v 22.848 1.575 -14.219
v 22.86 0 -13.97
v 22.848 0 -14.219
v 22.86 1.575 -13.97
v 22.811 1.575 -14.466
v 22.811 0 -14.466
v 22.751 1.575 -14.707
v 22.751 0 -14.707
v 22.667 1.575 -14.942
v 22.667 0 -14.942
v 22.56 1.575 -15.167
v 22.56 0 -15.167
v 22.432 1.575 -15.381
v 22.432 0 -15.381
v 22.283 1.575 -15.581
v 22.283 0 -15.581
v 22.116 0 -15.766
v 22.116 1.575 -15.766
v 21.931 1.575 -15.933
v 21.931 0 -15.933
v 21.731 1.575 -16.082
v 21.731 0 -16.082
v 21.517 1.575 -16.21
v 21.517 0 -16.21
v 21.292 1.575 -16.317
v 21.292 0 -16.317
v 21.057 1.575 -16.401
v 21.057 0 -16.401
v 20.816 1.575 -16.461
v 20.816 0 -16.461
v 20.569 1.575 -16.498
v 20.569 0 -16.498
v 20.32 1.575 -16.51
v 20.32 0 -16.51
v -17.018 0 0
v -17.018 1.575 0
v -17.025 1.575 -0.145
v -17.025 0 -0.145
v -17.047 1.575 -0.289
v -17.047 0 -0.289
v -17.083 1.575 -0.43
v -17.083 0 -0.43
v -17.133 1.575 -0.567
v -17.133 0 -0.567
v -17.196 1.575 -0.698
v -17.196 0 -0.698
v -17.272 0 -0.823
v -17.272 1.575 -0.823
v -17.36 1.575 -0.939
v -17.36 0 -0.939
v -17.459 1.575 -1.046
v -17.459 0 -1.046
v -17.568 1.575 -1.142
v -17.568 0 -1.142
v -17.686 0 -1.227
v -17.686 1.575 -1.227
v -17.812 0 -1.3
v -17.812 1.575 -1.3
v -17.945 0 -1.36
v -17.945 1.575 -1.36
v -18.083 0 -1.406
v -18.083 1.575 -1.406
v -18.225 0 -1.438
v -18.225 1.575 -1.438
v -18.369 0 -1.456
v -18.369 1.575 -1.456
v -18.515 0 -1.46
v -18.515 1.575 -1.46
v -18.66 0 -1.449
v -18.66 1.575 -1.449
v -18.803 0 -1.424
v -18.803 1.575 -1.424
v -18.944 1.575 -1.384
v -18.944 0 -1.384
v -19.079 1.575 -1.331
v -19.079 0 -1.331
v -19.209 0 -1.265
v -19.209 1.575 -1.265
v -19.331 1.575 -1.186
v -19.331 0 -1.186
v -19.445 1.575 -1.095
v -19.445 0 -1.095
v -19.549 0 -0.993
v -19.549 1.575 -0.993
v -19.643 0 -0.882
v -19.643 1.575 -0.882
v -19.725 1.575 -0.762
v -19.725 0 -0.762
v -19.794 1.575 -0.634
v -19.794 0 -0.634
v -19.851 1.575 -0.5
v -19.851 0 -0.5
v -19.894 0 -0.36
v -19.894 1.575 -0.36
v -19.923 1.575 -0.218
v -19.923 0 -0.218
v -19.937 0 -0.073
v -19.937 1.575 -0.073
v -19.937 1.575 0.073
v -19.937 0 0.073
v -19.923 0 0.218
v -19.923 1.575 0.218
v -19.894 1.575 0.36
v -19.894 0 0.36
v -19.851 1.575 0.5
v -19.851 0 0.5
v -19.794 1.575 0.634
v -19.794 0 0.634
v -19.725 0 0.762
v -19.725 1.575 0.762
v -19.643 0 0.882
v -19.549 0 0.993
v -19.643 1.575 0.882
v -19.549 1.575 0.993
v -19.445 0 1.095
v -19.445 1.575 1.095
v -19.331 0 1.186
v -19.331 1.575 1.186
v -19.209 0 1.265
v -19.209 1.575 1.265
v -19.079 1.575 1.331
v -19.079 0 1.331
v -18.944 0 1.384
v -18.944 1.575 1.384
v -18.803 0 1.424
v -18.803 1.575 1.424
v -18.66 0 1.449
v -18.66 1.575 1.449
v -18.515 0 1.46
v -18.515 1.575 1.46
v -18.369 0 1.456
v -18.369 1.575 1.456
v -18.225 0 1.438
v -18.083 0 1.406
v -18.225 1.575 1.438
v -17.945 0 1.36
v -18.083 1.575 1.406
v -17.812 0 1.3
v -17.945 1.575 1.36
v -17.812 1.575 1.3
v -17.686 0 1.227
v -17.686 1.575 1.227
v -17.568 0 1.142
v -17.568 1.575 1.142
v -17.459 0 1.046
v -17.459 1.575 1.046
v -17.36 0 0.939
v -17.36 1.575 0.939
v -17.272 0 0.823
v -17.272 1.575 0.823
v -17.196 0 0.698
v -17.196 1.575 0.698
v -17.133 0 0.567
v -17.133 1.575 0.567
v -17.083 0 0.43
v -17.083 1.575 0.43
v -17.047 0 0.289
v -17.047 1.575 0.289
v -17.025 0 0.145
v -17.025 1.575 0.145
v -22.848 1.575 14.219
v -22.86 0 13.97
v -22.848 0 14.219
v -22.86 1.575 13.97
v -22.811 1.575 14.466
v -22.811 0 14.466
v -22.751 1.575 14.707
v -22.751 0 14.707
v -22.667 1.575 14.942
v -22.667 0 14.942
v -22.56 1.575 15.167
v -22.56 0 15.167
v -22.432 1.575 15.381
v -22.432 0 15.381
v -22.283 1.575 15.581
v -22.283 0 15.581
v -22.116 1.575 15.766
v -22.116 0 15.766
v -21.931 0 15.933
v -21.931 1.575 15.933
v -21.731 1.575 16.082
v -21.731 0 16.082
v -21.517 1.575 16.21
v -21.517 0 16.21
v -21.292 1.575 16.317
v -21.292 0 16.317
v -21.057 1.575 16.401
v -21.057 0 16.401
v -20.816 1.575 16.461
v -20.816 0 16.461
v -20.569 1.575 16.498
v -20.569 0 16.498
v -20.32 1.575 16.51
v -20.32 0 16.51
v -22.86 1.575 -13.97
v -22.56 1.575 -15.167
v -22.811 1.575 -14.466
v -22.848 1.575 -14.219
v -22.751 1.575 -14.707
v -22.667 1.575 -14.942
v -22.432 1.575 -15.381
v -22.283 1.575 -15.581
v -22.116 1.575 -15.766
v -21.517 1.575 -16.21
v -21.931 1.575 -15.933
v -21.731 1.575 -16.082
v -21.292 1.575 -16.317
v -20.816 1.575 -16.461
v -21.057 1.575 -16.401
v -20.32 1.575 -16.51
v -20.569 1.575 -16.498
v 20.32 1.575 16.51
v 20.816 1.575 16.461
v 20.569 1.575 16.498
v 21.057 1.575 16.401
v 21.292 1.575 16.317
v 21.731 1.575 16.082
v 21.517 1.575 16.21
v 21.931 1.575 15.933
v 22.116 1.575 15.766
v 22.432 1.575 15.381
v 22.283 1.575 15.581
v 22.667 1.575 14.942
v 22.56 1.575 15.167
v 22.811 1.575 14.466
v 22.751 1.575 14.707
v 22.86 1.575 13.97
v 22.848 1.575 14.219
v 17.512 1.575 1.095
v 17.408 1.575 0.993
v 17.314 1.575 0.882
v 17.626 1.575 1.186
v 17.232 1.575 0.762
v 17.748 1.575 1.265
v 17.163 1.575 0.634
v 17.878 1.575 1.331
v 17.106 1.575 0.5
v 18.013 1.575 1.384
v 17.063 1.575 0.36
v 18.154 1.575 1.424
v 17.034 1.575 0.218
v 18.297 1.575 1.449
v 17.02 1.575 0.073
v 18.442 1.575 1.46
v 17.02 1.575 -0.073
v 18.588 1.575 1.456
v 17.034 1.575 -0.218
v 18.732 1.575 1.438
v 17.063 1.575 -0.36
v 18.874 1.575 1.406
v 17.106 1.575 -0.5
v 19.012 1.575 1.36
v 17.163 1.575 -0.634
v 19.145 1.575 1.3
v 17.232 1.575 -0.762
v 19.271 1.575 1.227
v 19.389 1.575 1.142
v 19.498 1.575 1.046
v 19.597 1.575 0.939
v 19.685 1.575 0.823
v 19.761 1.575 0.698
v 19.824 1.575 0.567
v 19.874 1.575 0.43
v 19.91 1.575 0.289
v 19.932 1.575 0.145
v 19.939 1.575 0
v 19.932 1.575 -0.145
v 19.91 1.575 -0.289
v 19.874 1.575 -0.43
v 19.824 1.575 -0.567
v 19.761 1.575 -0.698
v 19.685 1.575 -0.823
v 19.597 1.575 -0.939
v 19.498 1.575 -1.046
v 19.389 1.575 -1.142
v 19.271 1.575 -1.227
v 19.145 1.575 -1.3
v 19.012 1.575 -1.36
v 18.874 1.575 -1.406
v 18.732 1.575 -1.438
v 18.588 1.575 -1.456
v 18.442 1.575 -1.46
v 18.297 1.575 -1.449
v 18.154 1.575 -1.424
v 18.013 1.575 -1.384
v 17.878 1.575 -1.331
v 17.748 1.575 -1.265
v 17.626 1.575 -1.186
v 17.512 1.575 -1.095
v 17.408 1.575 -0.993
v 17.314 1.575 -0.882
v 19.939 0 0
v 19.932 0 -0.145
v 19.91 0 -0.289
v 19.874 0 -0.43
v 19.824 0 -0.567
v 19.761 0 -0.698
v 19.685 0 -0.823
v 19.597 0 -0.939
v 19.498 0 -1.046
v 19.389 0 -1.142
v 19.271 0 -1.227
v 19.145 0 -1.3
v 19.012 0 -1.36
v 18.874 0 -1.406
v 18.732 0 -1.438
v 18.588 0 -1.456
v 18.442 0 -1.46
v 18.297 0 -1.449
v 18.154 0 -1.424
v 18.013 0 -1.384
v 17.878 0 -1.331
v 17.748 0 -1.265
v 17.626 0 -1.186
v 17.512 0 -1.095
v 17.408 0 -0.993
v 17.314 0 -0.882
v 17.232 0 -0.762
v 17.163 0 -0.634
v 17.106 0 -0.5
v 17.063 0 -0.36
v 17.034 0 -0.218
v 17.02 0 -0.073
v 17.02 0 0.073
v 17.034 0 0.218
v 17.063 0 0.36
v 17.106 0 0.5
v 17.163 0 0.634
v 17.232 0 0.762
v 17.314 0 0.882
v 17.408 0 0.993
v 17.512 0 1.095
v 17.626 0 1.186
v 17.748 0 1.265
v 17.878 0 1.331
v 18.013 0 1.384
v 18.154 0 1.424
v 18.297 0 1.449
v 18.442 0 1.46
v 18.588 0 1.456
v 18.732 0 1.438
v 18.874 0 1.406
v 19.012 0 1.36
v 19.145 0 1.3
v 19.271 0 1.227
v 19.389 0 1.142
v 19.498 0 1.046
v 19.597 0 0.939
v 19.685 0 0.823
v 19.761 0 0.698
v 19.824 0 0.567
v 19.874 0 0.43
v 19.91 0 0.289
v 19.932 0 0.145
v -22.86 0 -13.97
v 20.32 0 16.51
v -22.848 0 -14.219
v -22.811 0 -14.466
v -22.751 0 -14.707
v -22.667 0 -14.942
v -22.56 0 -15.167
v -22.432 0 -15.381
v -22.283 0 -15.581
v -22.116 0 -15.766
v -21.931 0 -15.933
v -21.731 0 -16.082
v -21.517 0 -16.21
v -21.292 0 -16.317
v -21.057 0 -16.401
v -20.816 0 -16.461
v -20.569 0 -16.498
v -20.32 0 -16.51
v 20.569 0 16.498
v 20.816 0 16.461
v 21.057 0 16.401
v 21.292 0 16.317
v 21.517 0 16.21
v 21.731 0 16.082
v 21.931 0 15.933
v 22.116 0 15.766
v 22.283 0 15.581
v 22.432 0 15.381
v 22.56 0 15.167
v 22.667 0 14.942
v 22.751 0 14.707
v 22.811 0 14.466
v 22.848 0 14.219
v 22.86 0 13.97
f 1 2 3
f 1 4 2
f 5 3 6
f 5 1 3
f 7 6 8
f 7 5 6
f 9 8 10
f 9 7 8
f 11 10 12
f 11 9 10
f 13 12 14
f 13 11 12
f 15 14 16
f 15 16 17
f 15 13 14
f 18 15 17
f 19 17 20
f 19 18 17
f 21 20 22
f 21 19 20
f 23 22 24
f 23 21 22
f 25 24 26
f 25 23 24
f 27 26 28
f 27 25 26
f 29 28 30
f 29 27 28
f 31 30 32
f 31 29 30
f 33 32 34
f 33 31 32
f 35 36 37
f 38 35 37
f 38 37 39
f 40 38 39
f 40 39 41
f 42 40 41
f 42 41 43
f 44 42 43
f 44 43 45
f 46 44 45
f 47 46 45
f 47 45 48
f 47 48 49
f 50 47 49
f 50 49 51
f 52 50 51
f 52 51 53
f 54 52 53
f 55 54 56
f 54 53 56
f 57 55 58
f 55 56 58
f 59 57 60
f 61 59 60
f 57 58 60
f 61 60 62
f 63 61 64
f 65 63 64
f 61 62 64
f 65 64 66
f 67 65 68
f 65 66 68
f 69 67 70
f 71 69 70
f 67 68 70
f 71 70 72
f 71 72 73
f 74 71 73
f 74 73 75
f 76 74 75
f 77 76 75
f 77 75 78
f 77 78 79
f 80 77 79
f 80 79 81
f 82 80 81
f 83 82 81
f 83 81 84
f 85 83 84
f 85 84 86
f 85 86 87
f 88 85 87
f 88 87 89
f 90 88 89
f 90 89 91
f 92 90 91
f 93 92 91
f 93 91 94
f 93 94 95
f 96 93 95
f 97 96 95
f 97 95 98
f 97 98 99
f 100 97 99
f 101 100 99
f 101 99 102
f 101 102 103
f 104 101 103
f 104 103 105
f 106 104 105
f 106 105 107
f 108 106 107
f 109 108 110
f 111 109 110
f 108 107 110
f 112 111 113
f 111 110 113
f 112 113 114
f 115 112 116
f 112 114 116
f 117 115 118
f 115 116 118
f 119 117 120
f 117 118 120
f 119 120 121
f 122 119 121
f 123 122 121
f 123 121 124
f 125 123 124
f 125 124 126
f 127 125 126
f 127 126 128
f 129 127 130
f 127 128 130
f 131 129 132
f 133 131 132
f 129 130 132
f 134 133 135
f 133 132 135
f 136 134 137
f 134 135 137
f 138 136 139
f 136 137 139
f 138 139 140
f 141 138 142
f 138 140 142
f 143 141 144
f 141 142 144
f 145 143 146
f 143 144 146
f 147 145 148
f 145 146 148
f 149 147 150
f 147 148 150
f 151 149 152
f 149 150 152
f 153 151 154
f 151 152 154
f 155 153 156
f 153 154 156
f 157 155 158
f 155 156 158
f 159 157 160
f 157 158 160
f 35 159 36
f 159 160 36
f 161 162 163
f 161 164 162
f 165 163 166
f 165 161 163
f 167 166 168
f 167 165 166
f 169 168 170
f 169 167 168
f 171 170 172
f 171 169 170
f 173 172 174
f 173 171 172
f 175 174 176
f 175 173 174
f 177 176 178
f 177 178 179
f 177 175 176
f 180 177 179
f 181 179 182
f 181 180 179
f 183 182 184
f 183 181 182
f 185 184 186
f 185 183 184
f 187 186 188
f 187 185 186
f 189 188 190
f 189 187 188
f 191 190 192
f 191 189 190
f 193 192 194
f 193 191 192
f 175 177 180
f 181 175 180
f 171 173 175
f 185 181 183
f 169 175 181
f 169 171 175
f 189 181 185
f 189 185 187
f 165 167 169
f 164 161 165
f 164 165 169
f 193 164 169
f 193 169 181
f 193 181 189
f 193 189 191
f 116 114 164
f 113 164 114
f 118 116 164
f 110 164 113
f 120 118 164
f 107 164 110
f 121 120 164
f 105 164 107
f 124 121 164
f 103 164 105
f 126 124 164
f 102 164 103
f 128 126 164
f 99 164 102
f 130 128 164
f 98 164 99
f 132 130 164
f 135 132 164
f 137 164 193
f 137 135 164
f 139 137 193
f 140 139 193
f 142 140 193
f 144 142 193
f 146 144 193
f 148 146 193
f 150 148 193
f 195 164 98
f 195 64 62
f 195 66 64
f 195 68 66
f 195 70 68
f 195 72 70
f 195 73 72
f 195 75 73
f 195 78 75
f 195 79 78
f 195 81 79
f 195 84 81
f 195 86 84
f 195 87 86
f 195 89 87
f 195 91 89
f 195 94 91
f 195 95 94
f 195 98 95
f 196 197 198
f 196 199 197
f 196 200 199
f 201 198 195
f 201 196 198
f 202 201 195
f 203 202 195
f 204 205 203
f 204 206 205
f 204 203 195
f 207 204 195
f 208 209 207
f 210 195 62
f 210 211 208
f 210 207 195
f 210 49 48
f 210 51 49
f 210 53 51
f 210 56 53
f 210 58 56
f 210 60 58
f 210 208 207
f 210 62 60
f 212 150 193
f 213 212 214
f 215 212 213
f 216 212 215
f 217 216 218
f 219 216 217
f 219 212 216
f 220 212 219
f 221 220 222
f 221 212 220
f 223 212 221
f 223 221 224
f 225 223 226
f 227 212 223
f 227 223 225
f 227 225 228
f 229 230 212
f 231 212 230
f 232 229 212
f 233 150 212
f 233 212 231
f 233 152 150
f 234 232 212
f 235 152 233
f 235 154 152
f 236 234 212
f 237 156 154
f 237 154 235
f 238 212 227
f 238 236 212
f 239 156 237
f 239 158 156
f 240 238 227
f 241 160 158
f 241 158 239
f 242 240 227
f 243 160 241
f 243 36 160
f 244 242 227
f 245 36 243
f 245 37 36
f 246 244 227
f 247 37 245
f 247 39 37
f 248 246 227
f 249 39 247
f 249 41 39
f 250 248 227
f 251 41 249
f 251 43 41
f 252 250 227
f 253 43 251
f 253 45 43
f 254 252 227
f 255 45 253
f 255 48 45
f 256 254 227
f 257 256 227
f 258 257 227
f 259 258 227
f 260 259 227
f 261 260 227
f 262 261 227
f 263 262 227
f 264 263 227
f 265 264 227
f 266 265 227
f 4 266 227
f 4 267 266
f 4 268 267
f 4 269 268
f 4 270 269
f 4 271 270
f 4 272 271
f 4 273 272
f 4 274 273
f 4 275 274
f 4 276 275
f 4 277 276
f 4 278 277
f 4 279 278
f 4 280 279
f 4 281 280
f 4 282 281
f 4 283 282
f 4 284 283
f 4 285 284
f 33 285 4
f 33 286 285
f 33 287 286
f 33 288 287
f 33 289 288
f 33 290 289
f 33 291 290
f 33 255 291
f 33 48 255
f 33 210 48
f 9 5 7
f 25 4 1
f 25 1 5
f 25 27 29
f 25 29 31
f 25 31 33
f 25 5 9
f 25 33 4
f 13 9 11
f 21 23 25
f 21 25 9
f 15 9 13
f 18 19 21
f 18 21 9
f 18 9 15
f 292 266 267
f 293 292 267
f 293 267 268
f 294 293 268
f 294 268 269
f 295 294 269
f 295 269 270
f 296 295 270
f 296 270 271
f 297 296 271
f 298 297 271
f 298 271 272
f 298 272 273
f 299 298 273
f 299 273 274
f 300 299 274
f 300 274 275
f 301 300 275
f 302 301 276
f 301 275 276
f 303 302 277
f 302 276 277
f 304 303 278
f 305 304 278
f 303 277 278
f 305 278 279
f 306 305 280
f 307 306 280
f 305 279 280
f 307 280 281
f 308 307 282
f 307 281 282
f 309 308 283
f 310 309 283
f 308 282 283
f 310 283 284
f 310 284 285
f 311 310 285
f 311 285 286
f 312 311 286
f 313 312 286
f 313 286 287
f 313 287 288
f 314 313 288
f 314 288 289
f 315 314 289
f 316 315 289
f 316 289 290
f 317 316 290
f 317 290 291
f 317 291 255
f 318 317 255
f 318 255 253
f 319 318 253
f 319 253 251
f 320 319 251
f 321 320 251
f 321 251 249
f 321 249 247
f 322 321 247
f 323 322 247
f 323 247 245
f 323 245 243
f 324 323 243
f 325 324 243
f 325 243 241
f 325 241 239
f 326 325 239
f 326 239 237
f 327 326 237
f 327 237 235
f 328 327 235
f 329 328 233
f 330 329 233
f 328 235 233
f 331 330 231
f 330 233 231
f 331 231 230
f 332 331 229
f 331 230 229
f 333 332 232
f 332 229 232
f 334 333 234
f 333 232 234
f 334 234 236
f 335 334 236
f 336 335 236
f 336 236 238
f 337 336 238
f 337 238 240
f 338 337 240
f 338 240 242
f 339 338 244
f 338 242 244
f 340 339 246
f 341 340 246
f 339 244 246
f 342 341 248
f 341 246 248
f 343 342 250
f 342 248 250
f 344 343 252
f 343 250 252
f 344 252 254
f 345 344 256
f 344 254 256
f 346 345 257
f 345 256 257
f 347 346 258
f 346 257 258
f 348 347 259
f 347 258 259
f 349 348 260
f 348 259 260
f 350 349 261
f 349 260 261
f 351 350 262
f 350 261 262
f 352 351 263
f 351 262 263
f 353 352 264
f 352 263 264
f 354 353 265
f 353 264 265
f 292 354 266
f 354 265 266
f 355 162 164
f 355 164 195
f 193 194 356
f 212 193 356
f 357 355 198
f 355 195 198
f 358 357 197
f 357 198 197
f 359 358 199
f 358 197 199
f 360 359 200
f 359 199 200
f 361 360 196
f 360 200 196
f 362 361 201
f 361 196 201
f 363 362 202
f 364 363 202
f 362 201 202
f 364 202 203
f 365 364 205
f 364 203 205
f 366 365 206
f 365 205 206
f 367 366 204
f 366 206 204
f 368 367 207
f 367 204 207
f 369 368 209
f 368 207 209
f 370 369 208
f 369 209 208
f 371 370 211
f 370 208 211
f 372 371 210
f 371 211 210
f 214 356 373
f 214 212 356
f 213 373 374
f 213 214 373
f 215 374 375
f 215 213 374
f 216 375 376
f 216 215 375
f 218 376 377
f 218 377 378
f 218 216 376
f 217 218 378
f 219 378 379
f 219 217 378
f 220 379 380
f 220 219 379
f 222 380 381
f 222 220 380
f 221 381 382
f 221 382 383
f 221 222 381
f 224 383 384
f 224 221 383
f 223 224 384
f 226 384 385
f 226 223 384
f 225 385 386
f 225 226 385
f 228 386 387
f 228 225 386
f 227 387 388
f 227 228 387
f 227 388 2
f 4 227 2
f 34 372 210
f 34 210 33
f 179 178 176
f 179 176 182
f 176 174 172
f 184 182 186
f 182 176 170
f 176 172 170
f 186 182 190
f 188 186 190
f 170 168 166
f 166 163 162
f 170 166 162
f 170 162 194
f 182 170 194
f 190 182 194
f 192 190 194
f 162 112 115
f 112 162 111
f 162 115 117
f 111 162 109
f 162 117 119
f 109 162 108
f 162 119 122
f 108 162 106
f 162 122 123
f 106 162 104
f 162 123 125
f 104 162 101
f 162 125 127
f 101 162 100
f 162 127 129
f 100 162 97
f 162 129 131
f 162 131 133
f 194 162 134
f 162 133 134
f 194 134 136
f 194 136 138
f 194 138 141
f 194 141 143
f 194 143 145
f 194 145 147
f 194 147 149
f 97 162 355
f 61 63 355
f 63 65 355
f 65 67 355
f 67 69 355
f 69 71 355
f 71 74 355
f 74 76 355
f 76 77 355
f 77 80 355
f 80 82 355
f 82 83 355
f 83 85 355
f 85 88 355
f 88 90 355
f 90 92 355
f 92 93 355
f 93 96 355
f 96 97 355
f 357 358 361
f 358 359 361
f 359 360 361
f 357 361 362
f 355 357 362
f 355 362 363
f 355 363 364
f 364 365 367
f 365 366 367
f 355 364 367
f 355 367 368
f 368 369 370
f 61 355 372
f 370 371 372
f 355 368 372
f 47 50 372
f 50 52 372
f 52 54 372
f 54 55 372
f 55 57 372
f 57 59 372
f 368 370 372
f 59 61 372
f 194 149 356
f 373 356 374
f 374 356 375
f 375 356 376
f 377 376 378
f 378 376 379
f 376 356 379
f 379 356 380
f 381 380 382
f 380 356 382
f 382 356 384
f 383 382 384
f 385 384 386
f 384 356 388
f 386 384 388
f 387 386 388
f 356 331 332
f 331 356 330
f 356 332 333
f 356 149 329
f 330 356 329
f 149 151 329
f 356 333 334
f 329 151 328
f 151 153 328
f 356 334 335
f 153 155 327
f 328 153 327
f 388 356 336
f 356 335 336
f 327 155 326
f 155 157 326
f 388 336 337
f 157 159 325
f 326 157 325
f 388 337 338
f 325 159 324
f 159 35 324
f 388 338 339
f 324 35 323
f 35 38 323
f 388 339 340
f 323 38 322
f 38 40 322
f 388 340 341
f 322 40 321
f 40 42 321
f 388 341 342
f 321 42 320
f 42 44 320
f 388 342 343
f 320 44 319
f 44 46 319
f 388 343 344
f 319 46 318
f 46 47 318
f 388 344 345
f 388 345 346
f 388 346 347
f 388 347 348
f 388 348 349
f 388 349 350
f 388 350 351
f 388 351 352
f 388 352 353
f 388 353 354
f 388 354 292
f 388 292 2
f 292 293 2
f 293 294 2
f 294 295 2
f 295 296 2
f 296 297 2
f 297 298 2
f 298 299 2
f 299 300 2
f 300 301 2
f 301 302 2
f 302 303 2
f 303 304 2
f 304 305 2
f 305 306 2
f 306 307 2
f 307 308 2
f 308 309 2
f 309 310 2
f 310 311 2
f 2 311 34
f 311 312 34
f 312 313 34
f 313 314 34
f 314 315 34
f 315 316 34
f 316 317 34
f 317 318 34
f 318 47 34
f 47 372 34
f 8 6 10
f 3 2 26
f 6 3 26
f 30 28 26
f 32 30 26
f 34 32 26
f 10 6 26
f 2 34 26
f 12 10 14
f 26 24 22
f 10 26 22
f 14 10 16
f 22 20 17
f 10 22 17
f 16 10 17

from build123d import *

# Parameters (mm, degrees)
SKETCH1_W           = 45.72
SKETCH1_H           = 33.02
BOSS_EXTRUDE1_DEPTH = 1.5748
FILLET1_R           = 2.54
SKETCH2_R           = 1.4605
CUT_EXTRUDE1_DEPTH  = 2.5748


with BuildPart() as part:
    # Sketch1 → Boss-Extrude1 (new body)
    with BuildSketch(Plane(origin=(0, 0, 0), x_dir=(1, 0, 0), z_dir=(0, 1, 0))):
        Rectangle(SKETCH1_W, SKETCH1_H)
    extrude(amount=BOSS_EXTRUDE1_DEPTH)

    # Fillet1
    fillet1_edges = [part.edges().sort_by_distance(p)[0] for p in [
        (-22.86, 0.7874, -16.51),
        (22.86, 0.7874, -16.51),
        (22.86, 0.7874, 16.51),
        (-22.86, 0.7874, 16.51),
    ]]
    fillet(fillet1_edges, radius=FILLET1_R)

    # Sketch2 → Cut-Extrude1 (cut, through all)
    with BuildSketch(Plane(origin=(0, 1.5748, 0), x_dir=(1, 0, 0), z_dir=(0, 1, 0))):
        with Locations((-18.4785, 0)):
            Circle(SKETCH2_R)
        with Locations((18.4785, 0)):
            Circle(SKETCH2_R)
    extrude(amount=-CUT_EXTRUDE1_DEPTH, mode=Mode.SUBTRACT)


solid = part.part
